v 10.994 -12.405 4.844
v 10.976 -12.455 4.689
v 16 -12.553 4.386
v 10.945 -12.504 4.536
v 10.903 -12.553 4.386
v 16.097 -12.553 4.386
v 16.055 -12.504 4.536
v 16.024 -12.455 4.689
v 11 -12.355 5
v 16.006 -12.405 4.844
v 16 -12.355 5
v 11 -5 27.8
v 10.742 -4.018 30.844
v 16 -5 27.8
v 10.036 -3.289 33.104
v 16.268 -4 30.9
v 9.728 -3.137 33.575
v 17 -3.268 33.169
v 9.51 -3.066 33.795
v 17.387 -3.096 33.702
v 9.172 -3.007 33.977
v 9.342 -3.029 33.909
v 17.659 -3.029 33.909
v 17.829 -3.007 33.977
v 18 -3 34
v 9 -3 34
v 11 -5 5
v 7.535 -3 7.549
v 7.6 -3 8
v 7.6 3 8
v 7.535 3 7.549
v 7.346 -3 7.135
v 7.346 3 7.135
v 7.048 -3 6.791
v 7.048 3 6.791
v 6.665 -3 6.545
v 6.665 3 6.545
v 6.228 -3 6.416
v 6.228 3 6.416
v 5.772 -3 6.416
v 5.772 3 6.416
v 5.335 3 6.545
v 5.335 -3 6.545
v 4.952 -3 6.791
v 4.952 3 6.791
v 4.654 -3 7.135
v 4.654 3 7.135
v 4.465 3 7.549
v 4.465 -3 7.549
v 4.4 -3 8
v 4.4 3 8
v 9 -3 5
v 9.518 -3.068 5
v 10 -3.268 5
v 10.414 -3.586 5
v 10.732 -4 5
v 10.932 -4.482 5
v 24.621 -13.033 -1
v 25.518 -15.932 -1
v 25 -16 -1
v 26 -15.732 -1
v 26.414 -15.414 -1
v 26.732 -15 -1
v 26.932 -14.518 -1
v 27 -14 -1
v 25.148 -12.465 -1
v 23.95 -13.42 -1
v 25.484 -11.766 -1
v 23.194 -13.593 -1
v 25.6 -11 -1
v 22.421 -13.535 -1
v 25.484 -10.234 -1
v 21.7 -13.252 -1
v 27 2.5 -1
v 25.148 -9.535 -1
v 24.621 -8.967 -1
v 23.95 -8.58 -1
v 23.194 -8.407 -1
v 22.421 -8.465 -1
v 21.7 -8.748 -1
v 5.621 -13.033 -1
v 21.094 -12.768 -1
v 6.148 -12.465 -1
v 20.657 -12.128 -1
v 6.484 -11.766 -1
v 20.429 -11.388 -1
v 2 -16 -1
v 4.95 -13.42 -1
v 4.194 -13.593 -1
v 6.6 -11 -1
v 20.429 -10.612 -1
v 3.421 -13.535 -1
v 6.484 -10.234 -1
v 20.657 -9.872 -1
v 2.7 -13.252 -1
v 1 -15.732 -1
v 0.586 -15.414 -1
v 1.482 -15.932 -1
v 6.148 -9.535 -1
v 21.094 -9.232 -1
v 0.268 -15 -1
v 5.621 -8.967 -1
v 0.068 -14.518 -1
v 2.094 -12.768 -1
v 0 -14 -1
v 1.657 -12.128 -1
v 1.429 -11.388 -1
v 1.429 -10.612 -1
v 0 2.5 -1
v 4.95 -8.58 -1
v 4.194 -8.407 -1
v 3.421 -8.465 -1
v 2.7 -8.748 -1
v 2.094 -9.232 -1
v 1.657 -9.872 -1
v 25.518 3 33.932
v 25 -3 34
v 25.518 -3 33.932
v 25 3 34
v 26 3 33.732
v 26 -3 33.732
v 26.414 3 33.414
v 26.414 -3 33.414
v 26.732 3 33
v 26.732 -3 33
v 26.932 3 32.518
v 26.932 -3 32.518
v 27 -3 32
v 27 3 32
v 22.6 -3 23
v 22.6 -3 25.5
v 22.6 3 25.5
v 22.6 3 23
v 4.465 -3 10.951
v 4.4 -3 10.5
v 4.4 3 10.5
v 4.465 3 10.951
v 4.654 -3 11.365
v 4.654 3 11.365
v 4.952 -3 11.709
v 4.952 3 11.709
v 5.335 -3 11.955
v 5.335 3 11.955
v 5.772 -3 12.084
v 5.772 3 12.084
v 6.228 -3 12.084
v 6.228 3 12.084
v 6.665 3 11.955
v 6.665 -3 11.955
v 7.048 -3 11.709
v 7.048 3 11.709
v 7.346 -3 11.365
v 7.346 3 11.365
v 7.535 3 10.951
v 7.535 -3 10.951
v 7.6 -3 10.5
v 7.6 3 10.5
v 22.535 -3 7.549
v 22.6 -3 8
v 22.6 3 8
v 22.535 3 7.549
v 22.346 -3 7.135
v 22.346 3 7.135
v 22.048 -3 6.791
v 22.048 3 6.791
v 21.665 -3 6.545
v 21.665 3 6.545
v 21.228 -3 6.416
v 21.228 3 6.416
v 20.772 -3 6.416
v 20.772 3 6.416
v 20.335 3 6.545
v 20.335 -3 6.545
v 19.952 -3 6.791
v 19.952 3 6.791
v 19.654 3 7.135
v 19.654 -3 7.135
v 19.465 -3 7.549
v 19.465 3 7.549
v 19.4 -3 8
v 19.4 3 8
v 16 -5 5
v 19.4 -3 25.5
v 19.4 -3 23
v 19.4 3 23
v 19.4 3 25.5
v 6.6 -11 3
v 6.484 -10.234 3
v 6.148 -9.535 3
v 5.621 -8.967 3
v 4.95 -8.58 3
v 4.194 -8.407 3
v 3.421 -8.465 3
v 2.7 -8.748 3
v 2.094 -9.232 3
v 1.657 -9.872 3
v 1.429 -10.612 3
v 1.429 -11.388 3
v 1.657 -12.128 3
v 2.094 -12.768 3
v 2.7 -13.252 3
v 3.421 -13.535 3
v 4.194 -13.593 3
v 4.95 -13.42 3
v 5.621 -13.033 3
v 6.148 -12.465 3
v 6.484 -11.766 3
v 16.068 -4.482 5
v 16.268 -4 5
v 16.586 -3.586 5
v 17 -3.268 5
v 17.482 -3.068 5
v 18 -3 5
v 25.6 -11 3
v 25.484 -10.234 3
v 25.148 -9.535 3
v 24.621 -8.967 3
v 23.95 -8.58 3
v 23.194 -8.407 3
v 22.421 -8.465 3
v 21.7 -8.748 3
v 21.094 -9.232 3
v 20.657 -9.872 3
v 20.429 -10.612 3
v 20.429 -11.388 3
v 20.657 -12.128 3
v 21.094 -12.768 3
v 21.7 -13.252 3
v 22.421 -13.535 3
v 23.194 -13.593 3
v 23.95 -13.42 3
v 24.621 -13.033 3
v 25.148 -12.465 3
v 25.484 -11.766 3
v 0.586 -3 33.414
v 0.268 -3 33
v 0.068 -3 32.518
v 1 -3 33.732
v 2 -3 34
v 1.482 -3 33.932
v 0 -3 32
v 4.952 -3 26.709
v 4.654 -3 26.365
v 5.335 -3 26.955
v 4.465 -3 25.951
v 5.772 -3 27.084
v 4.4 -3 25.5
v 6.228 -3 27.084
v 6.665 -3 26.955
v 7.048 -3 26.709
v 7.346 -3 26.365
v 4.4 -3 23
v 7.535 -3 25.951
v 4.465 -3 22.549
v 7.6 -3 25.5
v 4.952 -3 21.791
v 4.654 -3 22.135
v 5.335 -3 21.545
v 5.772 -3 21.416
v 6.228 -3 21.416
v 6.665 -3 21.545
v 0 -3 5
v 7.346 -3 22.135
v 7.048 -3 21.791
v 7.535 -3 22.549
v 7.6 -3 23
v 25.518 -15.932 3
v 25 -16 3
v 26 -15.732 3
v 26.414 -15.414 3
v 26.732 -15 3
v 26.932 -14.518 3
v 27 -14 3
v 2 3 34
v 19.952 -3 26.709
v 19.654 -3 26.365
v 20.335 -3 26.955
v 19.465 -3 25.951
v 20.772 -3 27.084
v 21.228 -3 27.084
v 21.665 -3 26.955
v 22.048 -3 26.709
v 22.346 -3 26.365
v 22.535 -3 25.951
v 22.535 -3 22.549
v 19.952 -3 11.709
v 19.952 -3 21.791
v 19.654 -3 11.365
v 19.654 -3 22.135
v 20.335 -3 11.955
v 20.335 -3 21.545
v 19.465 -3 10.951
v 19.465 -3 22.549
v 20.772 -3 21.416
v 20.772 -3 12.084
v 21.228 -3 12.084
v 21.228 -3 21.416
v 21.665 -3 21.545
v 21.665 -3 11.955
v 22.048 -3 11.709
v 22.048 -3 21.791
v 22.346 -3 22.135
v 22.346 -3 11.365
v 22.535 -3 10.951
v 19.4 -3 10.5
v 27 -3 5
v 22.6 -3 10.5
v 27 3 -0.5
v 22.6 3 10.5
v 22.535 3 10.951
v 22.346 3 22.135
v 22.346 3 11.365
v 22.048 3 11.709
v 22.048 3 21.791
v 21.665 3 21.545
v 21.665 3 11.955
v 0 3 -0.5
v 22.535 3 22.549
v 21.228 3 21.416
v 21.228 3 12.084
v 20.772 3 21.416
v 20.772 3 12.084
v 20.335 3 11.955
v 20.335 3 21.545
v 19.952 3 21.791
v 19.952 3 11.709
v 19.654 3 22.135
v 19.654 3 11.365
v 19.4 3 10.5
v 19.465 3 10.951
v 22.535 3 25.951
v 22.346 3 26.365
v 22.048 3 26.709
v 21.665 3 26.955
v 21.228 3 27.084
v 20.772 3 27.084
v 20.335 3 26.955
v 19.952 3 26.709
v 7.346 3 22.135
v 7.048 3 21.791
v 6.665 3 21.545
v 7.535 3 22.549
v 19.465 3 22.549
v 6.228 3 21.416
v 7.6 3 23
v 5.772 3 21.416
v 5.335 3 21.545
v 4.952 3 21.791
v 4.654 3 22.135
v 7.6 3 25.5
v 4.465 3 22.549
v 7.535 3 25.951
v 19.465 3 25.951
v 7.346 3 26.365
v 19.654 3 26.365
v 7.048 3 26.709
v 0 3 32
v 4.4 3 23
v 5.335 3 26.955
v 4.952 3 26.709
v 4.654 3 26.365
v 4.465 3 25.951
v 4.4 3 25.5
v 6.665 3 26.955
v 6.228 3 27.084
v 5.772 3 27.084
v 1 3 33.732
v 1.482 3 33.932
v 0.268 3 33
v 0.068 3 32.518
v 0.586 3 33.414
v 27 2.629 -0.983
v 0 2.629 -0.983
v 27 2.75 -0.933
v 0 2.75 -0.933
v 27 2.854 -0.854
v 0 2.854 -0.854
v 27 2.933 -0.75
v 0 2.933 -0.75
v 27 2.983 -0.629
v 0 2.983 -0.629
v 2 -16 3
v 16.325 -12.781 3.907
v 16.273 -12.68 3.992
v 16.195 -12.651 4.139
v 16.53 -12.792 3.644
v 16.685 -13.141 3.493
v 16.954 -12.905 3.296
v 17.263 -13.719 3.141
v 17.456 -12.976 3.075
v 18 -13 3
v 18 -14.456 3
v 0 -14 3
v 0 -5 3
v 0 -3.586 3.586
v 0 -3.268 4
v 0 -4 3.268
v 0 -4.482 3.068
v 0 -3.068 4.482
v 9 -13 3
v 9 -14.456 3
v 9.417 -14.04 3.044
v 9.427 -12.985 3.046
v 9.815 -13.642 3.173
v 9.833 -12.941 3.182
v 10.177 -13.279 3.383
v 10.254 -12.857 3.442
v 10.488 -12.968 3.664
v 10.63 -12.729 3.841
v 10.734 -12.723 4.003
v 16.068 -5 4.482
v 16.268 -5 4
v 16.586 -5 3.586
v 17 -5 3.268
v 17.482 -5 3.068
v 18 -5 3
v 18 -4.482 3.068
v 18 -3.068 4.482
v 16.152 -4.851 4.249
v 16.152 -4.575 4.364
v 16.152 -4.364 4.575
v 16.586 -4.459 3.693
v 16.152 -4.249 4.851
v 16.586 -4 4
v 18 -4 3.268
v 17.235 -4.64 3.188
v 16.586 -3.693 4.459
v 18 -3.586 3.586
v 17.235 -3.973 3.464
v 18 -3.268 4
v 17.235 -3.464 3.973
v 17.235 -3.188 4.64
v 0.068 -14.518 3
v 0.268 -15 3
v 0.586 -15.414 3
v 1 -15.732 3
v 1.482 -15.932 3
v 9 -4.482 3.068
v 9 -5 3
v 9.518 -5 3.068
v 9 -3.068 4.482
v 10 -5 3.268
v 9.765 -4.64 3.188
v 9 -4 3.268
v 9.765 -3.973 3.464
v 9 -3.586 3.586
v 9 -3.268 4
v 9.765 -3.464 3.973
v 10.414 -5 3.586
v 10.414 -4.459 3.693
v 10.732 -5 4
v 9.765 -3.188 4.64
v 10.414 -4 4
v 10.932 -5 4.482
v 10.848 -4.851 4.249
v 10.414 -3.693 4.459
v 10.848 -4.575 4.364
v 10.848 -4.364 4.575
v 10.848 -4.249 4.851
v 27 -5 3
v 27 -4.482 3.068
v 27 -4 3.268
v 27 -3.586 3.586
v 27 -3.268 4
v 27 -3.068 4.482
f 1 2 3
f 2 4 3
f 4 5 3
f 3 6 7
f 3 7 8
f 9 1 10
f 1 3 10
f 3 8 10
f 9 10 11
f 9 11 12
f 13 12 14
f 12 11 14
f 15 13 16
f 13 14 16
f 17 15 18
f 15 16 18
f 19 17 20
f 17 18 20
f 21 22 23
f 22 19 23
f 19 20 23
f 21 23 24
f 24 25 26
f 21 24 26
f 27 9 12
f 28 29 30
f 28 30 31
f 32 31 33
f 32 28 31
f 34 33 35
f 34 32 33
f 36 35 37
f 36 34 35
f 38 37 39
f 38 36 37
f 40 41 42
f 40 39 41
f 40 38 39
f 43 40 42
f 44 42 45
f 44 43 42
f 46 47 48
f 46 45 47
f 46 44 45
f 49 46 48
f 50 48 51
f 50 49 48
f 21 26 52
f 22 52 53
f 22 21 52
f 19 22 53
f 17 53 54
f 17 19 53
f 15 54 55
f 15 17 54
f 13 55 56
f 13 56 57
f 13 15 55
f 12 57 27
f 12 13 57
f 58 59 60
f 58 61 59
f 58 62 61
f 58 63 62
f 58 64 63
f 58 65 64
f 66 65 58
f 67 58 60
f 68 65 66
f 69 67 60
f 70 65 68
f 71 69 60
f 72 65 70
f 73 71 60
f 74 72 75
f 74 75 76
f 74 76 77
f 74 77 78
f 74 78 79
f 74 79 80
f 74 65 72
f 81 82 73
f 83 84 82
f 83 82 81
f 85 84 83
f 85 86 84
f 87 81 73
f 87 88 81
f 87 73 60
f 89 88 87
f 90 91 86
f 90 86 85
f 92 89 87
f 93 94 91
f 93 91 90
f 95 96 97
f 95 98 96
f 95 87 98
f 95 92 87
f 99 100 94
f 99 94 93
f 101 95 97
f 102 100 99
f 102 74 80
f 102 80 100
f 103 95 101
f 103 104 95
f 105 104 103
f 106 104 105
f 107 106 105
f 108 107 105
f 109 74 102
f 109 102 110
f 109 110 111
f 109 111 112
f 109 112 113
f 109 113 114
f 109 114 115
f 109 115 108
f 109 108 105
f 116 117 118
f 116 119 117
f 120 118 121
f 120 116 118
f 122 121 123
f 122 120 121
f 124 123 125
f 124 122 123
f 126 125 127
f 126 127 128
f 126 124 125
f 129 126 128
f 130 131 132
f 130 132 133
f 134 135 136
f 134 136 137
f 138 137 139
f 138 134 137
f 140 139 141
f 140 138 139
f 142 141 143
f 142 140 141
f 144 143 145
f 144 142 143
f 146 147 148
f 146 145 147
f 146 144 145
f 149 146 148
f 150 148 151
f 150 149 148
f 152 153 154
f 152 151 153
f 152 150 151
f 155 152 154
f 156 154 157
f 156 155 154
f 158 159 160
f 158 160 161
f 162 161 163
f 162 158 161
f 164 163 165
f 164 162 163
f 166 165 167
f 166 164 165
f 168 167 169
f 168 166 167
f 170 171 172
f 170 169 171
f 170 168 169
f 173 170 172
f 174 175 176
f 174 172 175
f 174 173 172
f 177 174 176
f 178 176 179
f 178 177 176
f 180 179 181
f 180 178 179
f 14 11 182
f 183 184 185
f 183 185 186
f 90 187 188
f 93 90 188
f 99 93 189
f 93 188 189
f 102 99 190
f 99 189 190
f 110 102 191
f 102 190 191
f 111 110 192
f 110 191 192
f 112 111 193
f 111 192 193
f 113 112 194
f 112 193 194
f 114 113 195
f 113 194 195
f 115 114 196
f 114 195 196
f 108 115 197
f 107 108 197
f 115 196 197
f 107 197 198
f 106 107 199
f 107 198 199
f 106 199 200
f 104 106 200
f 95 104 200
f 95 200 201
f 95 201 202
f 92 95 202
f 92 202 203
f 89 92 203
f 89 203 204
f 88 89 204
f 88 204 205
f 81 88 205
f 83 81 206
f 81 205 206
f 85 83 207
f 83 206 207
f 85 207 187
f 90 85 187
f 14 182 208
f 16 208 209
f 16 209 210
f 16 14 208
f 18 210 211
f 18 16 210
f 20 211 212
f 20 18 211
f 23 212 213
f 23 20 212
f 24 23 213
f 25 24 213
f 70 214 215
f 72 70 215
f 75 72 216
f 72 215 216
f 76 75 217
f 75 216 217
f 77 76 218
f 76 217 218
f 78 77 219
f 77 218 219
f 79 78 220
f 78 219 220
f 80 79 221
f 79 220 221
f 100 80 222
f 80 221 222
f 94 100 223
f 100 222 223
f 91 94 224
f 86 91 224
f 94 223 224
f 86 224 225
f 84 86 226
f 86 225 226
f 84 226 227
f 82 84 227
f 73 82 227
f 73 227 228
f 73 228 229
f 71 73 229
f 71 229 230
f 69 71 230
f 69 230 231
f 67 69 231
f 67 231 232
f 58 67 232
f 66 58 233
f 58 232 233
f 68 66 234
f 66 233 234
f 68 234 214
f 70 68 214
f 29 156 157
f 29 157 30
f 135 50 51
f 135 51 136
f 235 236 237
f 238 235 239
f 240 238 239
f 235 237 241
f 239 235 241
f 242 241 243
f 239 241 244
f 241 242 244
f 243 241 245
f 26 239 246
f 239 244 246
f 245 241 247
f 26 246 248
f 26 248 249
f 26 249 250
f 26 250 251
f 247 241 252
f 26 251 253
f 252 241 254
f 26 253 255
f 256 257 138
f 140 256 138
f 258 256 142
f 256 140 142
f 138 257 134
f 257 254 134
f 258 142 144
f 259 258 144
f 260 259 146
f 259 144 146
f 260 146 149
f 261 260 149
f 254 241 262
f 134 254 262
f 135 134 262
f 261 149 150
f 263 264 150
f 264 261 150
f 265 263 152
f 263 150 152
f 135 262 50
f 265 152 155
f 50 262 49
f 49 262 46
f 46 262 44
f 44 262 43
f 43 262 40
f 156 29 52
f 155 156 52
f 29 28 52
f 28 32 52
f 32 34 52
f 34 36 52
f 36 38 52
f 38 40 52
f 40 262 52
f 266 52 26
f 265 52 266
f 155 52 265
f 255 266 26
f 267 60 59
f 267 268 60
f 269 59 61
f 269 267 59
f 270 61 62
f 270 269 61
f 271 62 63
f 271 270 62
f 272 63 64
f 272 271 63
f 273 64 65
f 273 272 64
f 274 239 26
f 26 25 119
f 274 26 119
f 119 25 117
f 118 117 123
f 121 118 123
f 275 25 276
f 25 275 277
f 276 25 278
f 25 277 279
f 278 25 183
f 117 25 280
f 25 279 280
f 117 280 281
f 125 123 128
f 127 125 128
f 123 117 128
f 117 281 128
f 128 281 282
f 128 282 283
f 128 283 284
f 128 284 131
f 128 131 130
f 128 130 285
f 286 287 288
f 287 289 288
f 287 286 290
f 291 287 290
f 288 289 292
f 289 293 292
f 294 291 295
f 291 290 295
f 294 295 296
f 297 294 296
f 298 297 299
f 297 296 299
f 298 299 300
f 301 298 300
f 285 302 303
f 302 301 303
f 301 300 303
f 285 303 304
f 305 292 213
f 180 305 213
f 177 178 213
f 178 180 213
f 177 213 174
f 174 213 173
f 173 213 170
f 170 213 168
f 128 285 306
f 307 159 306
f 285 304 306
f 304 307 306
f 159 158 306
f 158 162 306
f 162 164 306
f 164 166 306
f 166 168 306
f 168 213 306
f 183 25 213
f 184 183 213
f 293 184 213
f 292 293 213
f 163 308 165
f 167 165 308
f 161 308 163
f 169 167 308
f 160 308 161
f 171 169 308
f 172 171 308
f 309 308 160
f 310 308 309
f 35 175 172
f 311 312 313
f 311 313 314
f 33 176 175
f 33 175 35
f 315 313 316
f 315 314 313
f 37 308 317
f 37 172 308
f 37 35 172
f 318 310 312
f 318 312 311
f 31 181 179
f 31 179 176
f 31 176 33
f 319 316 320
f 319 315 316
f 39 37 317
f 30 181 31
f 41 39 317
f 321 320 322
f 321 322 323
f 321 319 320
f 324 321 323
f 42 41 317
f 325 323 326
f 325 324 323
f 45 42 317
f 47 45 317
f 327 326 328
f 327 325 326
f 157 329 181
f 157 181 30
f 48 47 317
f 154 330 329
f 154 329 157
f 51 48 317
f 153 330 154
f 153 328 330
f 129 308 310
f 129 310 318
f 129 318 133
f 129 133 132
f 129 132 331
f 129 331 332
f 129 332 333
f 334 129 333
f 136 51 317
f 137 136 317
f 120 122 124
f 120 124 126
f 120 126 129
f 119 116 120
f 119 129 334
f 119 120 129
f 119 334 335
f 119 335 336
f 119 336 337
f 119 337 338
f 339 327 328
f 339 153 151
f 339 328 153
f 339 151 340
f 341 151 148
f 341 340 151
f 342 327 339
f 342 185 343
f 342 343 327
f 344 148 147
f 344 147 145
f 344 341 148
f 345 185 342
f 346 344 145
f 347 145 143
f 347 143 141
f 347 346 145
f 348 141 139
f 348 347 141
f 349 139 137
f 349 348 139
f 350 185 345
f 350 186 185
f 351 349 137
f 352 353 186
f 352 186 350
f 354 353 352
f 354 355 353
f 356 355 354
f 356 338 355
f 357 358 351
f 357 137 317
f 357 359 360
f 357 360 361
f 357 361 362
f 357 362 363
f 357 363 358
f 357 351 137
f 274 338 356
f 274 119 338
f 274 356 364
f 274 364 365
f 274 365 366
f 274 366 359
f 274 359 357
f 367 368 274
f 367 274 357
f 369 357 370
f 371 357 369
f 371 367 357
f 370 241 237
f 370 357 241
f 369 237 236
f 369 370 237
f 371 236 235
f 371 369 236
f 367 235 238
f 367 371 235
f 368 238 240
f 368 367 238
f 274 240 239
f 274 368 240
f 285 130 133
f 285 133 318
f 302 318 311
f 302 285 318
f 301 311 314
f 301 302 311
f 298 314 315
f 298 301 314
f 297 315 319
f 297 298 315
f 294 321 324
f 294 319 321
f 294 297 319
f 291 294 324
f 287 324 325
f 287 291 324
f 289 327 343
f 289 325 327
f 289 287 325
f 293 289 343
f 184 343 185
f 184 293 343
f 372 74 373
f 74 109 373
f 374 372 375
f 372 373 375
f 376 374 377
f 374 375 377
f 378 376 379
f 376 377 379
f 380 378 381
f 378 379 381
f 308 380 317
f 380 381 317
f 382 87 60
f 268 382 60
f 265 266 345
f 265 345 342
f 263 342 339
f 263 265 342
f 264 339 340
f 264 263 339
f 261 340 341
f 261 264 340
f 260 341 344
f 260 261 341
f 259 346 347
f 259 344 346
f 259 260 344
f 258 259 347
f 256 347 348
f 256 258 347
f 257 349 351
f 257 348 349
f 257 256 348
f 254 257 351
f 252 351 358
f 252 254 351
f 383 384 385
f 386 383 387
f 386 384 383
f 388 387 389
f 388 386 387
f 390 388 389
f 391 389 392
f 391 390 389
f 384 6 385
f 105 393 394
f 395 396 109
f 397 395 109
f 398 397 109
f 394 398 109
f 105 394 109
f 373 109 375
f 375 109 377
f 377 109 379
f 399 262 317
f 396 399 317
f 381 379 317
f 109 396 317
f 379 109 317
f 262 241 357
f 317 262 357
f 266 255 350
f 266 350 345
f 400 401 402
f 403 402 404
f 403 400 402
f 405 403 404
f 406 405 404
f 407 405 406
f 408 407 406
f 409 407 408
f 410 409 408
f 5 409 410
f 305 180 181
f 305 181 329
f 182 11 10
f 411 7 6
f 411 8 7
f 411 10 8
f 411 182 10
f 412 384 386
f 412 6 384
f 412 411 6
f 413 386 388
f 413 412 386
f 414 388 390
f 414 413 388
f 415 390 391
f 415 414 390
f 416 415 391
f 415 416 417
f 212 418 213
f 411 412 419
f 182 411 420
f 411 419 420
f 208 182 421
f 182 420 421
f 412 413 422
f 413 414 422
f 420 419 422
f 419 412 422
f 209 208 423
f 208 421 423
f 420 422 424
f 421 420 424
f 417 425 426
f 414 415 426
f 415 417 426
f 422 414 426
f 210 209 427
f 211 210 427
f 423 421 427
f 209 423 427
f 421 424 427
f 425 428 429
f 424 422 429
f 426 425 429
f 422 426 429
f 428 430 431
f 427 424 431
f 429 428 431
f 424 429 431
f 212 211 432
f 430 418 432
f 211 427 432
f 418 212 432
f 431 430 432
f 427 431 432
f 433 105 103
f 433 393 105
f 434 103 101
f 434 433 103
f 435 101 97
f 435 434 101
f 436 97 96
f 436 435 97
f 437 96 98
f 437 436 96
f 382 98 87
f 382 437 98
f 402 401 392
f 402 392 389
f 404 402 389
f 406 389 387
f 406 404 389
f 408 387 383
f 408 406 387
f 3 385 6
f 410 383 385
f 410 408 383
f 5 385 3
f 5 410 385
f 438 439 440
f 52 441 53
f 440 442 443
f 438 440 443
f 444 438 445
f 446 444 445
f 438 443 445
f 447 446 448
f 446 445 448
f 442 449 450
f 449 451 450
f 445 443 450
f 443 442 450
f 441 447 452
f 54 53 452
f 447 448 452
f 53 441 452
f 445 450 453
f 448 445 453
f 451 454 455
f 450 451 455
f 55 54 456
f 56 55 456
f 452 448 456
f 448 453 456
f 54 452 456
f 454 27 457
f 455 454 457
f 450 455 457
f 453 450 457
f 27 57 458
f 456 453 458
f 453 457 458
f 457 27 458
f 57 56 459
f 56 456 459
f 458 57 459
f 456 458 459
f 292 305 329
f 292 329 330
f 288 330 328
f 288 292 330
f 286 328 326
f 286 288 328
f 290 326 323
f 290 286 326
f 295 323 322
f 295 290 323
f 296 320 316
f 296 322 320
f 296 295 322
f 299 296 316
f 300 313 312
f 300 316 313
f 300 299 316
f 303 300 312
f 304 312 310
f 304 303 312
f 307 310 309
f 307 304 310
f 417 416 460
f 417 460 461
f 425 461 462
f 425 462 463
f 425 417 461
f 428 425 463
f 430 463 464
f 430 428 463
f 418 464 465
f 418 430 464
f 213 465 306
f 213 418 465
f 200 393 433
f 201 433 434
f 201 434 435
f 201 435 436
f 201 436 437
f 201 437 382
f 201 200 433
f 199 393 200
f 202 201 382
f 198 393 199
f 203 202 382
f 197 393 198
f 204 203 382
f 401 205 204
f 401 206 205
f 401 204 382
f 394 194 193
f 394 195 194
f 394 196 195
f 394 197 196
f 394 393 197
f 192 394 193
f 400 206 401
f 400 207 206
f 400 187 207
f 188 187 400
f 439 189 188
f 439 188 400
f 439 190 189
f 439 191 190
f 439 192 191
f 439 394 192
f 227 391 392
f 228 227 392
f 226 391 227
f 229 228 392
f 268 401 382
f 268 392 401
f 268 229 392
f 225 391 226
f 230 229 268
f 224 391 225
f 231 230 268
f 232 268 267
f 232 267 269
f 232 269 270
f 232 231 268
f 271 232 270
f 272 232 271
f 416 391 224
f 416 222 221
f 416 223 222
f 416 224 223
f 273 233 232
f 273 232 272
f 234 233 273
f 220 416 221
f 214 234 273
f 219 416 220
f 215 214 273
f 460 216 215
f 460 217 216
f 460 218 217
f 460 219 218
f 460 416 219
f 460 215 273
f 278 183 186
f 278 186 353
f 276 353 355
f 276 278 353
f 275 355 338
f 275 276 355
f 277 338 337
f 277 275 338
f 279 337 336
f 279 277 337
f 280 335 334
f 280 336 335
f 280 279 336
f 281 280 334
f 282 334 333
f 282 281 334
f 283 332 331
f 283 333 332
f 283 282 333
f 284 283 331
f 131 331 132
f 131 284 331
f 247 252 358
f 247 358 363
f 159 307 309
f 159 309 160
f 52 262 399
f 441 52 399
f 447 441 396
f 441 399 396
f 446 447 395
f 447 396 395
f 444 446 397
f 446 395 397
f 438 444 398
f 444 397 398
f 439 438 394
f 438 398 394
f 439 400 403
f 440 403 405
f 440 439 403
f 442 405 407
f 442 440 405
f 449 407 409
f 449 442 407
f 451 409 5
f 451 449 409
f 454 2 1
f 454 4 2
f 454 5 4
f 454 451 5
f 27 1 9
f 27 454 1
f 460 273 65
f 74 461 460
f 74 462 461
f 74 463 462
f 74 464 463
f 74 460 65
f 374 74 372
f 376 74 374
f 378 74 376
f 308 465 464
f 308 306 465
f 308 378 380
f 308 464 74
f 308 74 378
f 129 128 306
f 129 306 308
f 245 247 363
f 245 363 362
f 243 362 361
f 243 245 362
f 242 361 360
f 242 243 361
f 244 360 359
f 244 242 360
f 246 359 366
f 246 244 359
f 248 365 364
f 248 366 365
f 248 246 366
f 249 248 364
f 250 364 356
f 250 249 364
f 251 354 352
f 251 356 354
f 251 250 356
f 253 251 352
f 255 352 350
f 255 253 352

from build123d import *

# Parameters (mm, degrees)
EXTRUDE_2_DEPTH      = 3
EXTRUDE_2_DEPTH_BACK = 1
SKETCH_1_W           = 27
SKETCH_1_H           = 16
EXTRUDE_4_DEPTH      = 3
EXTRUDE_4_DEPTH_BACK = 3
SKETCH_3_W           = 27
SKETCH_3_H           = 34
CUT_EXTRUDE_11_DEPTH = 13
EXTRUDE_5_DEPTH      = 2.5
EXTRUDE_5_DEPTH_BACK = 2.5
FILLET_2_R           = 2
FILLET_3_R           = 2
SKETCH_14_W          = 27
SKETCH_14_H          = 3
EXTRUDE_6_DEPTH      = 1
FILLET_5_R           = 0.5
SKETCH_16_R          = 2.6
CUT_EXTRUDE_12_DEPTH = 4


with BuildPart() as part:
    # 草图1 → 凸台-拉伸2 (new, two sides: drawn at the far end of the back side and taken through both)
    with BuildSketch(Plane.XY.offset(-EXTRUDE_2_DEPTH_BACK)):
        with Locations((13.5, -8)):
            Rectangle(SKETCH_1_W, SKETCH_1_H)
    extrude(amount=EXTRUDE_2_DEPTH + EXTRUDE_2_DEPTH_BACK)

    # 草图3 → 凸台-拉伸4 (add, two sides: drawn at the far end of the back side and taken through both)
    with BuildSketch(Plane(origin=(0, 0, 0), x_dir=(1, 0, 0), z_dir=(0, 1, 0)).offset(-EXTRUDE_4_DEPTH_BACK)):
        with Locations((13.5, -17)):
            Rectangle(SKETCH_3_W, SKETCH_3_H)
    extrude(amount=EXTRUDE_4_DEPTH + EXTRUDE_4_DEPTH_BACK)

    # 草图4 → 切除-拉伸11 (cut)
    with BuildSketch(Plane(origin=(0, -3, 0), x_dir=(-1, 0, 0), z_dir=(0, -1, 0))):
        with BuildLine():
            Line((-7.6, -10.5), (-7.6, -8))
            ThreePointArc((-7.6, -8), (-6, -6.4), (-4.4, -8))
            Line((-4.4, -8), (-4.4, -10.5))
            ThreePointArc((-4.4, -10.5), (-6, -12.1), (-7.6, -10.5))
        make_face()
        with BuildLine():
            Line((-22.6, -10.5), (-22.6, -8))
            ThreePointArc((-22.6, -8), (-21, -6.4), (-19.4, -8))
            Line((-19.4, -8), (-19.4, -10.5))
            ThreePointArc((-19.4, -10.5), (-21, -12.1), (-22.6, -10.5))
        make_face()
        with BuildLine():
            Line((-7.6, -25.5), (-7.6, -23))
            ThreePointArc((-7.6, -23), (-6, -21.4), (-4.4, -23))
            Line((-4.4, -23), (-4.4, -25.5))
            ThreePointArc((-4.4, -25.5), (-6, -27.1), (-7.6, -25.5))
        make_face()
        with BuildLine():
            Line((-22.6, -25.5), (-22.6, -23))
            ThreePointArc((-22.6, -23), (-21, -21.4), (-19.4, -23))
            Line((-19.4, -23), (-19.4, -25.5))
            ThreePointArc((-19.4, -25.5), (-21, -27.1), (-22.6, -25.5))
        make_face()
    extrude(amount=-CUT_EXTRUDE_11_DEPTH, mode=Mode.SUBTRACT)

    # 草图13 → 凸台-拉伸5 (add, two sides: drawn at the far end of the back side and taken through both)
    with BuildSketch(Plane.ZY.offset(-13.5).offset(-EXTRUDE_5_DEPTH_BACK)):
        Polygon((3, -13), (34, -3), (3, -3), align=None)
    extrude(amount=EXTRUDE_5_DEPTH + EXTRUDE_5_DEPTH_BACK)

    # 圆角2
    fillet_2_edges = [part.edges().sort_by_distance(p)[0] for p in [
        (21.5, -3, 3),
        (5.5, -3, 3),
        (0, 0, 34),
        (27, 0, 34),
        (0, -16, 1),
        (27, -16, 1),
    ]]
    fillet(fillet_2_edges, radius=FILLET_2_R)

    # 圆角3
    # the kernel refuses this fillet: 2 mm, written as the material it adds along each edge
    with BuildSketch(Plane(origin=(11, -13, 3), x_dir=(0, -1, 0), z_dir=(1, 0, 0))) as fillet_3_piece_1:
        with BuildLine():
            CenterArc((FILLET_3_R * 0.728161127413, -FILLET_3_R), FILLET_3_R, 90, 72.121303404)
            Line((-FILLET_3_R * 0.223547490347, -FILLET_3_R * 0.692997220077), (0, 0))
            Line((0, 0), (FILLET_3_R * 0.728161127413, 0))
        make_face()
    extrude(amount=5)
    with BuildSketch(Plane(origin=(16, -3, 34), x_dir=(0, -1, 0), z_dir=(0, 0, -1))) as fillet_3_piece_2_section:
        with BuildLine():
            CenterArc((FILLET_3_R, -FILLET_3_R), FILLET_3_R, 90, 90)
            Line((0, -FILLET_3_R), (0, 0))
            Line((0, 0), (FILLET_3_R, 0))
        make_face()
    fillet_3_piece_2 = extrude(amount=29, mode=Mode.PRIVATE)
    fillet_3_piece_2 = split(fillet_3_piece_2, bisect_by=Plane(origin=(16.465034927, -7.473683047, 20.131582554), z_dir=(0, 0.9517086177605509, -0.3070027799227584)), keep=Keep.TOP, mode=Mode.PRIVATE)
    add(fillet_3_piece_2)
    with BuildSketch(Plane(origin=(11, -3, 34), x_dir=(-1, 0, 0), z_dir=(0, 0, -1))) as fillet_3_piece_3_section:
        with BuildLine():
            CenterArc((FILLET_3_R, -FILLET_3_R), FILLET_3_R, 90, 90)
            Line((0, -FILLET_3_R), (0, 0))
            Line((0, 0), (FILLET_3_R, 0))
        make_face()
    fillet_3_piece_3 = extrude(amount=29, mode=Mode.PRIVATE)
    fillet_3_piece_3 = split(fillet_3_piece_3, bisect_by=Plane(origin=(10.534965073, -7.473683047, 20.131582554), z_dir=(0, 0.9517086177605509, -0.3070027799227584)), keep=Keep.TOP, mode=Mode.PRIVATE)
    add(fillet_3_piece_3)
    with BuildSketch(Plane(origin=(11, -5, 3), x_dir=(-1, 0, 0), z_dir=(0, -1, 0))) as fillet_3_piece_4_section:
        with BuildLine():
            CenterArc((FILLET_3_R, -FILLET_3_R), FILLET_3_R, 90, 90)
            Line((0, -FILLET_3_R), (0, 0))
            Line((0, 0), (FILLET_3_R, 0))
        make_face()
    fillet_3_piece_4 = extrude(amount=13, mode=Mode.PRIVATE)
    fillet_3_piece_4 = split(fillet_3_piece_4, bisect_by=Plane(origin=(10.542698912, -12.486166037, 4.592885286), z_dir=(0, 0.9517086177605509, -0.3070027799227584)), keep=Keep.TOP, mode=Mode.PRIVATE)
    add(fillet_3_piece_4)
    with BuildSketch(Plane(origin=(11, -5, 5), x_dir=(0, 0, -1), z_dir=(0, -1, 0))) as fillet_3_piece_5:
        with BuildLine():
            CenterArc((2 - FILLET_3_R, -FILLET_3_R), FILLET_3_R, 0, 90)
            Line((2 - FILLET_3_R, 0), (2, 0))
            Line((2, 0), (2, -FILLET_3_R))
        make_face()
    revolve(axis=Axis((11, -5, 5), (1, 0, 0)), revolution_arc=90)
    with BuildSketch(Plane(origin=(16, -5, 3), x_dir=(1, 0, 0), z_dir=(0, -1, 0))) as fillet_3_piece_6_section:
        with BuildLine():
            CenterArc((FILLET_3_R, FILLET_3_R), FILLET_3_R, 180, 90)
            Line((0, FILLET_3_R), (0, 0))
            Line((0, 0), (FILLET_3_R, 0))
        make_face()
    fillet_3_piece_6 = extrude(amount=13, mode=Mode.PRIVATE)
    fillet_3_piece_6 = split(fillet_3_piece_6, bisect_by=Plane(origin=(16.457301088, -12.486166037, 4.592885286), z_dir=(0, 0.9517086177605509, -0.3070027799227584)), keep=Keep.TOP, mode=Mode.PRIVATE)
    add(fillet_3_piece_6)
    with BuildSketch(Plane(origin=(16, -5, 5), x_dir=(0, 0, -1), z_dir=(0, -1, 0))) as fillet_3_piece_7:
        with BuildLine():
            CenterArc((2 - FILLET_3_R, FILLET_3_R), FILLET_3_R, 270, 90)
            Line((2 - FILLET_3_R, 0), (2, 0))
            Line((2, 0), (2, FILLET_3_R))
        make_face()
    revolve(axis=Axis((16, -5, 5), (1, 0, 0)), revolution_arc=90)
    with BuildSketch(Plane(origin=(11, -5, 3), x_dir=(-1, 0, 0), z_dir=(0, -1, 0))) as fillet_3_piece_8a_section:
        with BuildLine():
            CenterArc((FILLET_3_R, -FILLET_3_R), FILLET_3_R, 90, 90)
            Line((0, -FILLET_3_R), (0, 0))
            Line((0, 0), (FILLET_3_R, 0))
        make_face()
    fillet_3_piece_8a = extrude(amount=13, mode=Mode.PRIVATE)
    fillet_3_piece_8a = split(fillet_3_piece_8a, bisect_by=Plane(origin=(10.55847084, -16, 3.471852111), z_dir=(0, 1, 0)), keep=Keep.TOP, mode=Mode.PRIVATE)
    fillet_3_piece_8a = split(fillet_3_piece_8a, bisect_by=Plane(origin=(10.55847084, -12.996338669, 3.011350127), z_dir=(0, -0.9517086177605509, 0.3070027799227584)), keep=Keep.TOP, mode=Mode.PRIVATE)
    with BuildSketch(Plane(origin=(7.359194363, -13, 3), x_dir=(0, -1, 0), z_dir=(1, 0, 0))) as fillet_3_piece_8b_section:
        with BuildLine():
            CenterArc((FILLET_3_R * 0.728161127413, -FILLET_3_R), FILLET_3_R, 90, 72.121303404)
            Line((-FILLET_3_R * 0.223547490347, -FILLET_3_R * 0.692997220077), (0, 0))
            Line((0, 0), (FILLET_3_R * 0.728161127413, 0))
        make_face()
    fillet_3_piece_8b = extrude(amount=8.640805637, mode=Mode.PRIVATE)
    fillet_3_piece_8b = split(fillet_3_piece_8b, bisect_by=Plane(origin=(11, -13.221902521, 3.304743707), z_dir=(-1, 0, 0)), keep=Keep.TOP, mode=Mode.PRIVATE)
    fillet_3_piece_8 = fillet_3_piece_8a & fillet_3_piece_8b
    add(fillet_3_piece_8)
    with BuildSketch(Plane(origin=(16, -5, 3), x_dir=(1, 0, 0), z_dir=(0, -1, 0))) as fillet_3_piece_9a_section:
        with BuildLine():
            CenterArc((FILLET_3_R, FILLET_3_R), FILLET_3_R, 180, 90)
            Line((0, FILLET_3_R), (0, 0))
            Line((0, 0), (FILLET_3_R, 0))
        make_face()
    fillet_3_piece_9a = extrude(amount=13, mode=Mode.PRIVATE)
    fillet_3_piece_9a = split(fillet_3_piece_9a, bisect_by=Plane(origin=(16.44152916, -16, 3.471852111), z_dir=(0, 1, 0)), keep=Keep.TOP, mode=Mode.PRIVATE)
    fillet_3_piece_9a = split(fillet_3_piece_9a, bisect_by=Plane(origin=(16.44152916, -12.996338669, 3.011350127), z_dir=(0, -0.9517086177605509, 0.3070027799227584)), keep=Keep.TOP, mode=Mode.PRIVATE)
    with BuildSketch(Plane(origin=(11, -13, 3), x_dir=(0, -1, 0), z_dir=(1, 0, 0))) as fillet_3_piece_9b_section:
        with BuildLine():
            CenterArc((FILLET_3_R * 0.728161127413, -FILLET_3_R), FILLET_3_R, 90, 72.121303404)
            Line((-FILLET_3_R * 0.223547490347, -FILLET_3_R * 0.692997220077), (0, 0))
            Line((0, 0), (FILLET_3_R * 0.728161127413, 0))
        make_face()
    fillet_3_piece_9b = extrude(amount=8.640805637, mode=Mode.PRIVATE)
    fillet_3_piece_9b = split(fillet_3_piece_9b, bisect_by=Plane(origin=(16, -13.221902521, 3.304743707), z_dir=(1, 0, 0)), keep=Keep.TOP, mode=Mode.PRIVATE)
    fillet_3_piece_9 = fillet_3_piece_9a & fillet_3_piece_9b
    add(fillet_3_piece_9)

    # 草图14 → 凸台-拉伸6 (add)
    with BuildSketch(Plane(origin=(0, 0, 0), x_dir=(-1, 0, 0), z_dir=(0, 0, -1))):
        with Locations((-13.5, 1.5)):
            Rectangle(SKETCH_14_W, SKETCH_14_H)
    extrude(amount=EXTRUDE_6_DEPTH)

    # 圆角5
    fillet_5_edges = [part.edges().sort_by_distance(p)[0] for p in [
        (13.5, 3, -1),
    ]]
    fillet(fillet_5_edges, radius=FILLET_5_R)

    # 草图16 → 切除-拉伸12 (cut)
    with BuildSketch(Plane.XY.offset(3)):
        with Locations((4, -11)):
            Circle(SKETCH_16_R)
        with Locations((23, -11)):
            Circle(SKETCH_16_R)
    extrude(amount=-CUT_EXTRUDE_12_DEPTH, mode=Mode.SUBTRACT)


solid = part.part
